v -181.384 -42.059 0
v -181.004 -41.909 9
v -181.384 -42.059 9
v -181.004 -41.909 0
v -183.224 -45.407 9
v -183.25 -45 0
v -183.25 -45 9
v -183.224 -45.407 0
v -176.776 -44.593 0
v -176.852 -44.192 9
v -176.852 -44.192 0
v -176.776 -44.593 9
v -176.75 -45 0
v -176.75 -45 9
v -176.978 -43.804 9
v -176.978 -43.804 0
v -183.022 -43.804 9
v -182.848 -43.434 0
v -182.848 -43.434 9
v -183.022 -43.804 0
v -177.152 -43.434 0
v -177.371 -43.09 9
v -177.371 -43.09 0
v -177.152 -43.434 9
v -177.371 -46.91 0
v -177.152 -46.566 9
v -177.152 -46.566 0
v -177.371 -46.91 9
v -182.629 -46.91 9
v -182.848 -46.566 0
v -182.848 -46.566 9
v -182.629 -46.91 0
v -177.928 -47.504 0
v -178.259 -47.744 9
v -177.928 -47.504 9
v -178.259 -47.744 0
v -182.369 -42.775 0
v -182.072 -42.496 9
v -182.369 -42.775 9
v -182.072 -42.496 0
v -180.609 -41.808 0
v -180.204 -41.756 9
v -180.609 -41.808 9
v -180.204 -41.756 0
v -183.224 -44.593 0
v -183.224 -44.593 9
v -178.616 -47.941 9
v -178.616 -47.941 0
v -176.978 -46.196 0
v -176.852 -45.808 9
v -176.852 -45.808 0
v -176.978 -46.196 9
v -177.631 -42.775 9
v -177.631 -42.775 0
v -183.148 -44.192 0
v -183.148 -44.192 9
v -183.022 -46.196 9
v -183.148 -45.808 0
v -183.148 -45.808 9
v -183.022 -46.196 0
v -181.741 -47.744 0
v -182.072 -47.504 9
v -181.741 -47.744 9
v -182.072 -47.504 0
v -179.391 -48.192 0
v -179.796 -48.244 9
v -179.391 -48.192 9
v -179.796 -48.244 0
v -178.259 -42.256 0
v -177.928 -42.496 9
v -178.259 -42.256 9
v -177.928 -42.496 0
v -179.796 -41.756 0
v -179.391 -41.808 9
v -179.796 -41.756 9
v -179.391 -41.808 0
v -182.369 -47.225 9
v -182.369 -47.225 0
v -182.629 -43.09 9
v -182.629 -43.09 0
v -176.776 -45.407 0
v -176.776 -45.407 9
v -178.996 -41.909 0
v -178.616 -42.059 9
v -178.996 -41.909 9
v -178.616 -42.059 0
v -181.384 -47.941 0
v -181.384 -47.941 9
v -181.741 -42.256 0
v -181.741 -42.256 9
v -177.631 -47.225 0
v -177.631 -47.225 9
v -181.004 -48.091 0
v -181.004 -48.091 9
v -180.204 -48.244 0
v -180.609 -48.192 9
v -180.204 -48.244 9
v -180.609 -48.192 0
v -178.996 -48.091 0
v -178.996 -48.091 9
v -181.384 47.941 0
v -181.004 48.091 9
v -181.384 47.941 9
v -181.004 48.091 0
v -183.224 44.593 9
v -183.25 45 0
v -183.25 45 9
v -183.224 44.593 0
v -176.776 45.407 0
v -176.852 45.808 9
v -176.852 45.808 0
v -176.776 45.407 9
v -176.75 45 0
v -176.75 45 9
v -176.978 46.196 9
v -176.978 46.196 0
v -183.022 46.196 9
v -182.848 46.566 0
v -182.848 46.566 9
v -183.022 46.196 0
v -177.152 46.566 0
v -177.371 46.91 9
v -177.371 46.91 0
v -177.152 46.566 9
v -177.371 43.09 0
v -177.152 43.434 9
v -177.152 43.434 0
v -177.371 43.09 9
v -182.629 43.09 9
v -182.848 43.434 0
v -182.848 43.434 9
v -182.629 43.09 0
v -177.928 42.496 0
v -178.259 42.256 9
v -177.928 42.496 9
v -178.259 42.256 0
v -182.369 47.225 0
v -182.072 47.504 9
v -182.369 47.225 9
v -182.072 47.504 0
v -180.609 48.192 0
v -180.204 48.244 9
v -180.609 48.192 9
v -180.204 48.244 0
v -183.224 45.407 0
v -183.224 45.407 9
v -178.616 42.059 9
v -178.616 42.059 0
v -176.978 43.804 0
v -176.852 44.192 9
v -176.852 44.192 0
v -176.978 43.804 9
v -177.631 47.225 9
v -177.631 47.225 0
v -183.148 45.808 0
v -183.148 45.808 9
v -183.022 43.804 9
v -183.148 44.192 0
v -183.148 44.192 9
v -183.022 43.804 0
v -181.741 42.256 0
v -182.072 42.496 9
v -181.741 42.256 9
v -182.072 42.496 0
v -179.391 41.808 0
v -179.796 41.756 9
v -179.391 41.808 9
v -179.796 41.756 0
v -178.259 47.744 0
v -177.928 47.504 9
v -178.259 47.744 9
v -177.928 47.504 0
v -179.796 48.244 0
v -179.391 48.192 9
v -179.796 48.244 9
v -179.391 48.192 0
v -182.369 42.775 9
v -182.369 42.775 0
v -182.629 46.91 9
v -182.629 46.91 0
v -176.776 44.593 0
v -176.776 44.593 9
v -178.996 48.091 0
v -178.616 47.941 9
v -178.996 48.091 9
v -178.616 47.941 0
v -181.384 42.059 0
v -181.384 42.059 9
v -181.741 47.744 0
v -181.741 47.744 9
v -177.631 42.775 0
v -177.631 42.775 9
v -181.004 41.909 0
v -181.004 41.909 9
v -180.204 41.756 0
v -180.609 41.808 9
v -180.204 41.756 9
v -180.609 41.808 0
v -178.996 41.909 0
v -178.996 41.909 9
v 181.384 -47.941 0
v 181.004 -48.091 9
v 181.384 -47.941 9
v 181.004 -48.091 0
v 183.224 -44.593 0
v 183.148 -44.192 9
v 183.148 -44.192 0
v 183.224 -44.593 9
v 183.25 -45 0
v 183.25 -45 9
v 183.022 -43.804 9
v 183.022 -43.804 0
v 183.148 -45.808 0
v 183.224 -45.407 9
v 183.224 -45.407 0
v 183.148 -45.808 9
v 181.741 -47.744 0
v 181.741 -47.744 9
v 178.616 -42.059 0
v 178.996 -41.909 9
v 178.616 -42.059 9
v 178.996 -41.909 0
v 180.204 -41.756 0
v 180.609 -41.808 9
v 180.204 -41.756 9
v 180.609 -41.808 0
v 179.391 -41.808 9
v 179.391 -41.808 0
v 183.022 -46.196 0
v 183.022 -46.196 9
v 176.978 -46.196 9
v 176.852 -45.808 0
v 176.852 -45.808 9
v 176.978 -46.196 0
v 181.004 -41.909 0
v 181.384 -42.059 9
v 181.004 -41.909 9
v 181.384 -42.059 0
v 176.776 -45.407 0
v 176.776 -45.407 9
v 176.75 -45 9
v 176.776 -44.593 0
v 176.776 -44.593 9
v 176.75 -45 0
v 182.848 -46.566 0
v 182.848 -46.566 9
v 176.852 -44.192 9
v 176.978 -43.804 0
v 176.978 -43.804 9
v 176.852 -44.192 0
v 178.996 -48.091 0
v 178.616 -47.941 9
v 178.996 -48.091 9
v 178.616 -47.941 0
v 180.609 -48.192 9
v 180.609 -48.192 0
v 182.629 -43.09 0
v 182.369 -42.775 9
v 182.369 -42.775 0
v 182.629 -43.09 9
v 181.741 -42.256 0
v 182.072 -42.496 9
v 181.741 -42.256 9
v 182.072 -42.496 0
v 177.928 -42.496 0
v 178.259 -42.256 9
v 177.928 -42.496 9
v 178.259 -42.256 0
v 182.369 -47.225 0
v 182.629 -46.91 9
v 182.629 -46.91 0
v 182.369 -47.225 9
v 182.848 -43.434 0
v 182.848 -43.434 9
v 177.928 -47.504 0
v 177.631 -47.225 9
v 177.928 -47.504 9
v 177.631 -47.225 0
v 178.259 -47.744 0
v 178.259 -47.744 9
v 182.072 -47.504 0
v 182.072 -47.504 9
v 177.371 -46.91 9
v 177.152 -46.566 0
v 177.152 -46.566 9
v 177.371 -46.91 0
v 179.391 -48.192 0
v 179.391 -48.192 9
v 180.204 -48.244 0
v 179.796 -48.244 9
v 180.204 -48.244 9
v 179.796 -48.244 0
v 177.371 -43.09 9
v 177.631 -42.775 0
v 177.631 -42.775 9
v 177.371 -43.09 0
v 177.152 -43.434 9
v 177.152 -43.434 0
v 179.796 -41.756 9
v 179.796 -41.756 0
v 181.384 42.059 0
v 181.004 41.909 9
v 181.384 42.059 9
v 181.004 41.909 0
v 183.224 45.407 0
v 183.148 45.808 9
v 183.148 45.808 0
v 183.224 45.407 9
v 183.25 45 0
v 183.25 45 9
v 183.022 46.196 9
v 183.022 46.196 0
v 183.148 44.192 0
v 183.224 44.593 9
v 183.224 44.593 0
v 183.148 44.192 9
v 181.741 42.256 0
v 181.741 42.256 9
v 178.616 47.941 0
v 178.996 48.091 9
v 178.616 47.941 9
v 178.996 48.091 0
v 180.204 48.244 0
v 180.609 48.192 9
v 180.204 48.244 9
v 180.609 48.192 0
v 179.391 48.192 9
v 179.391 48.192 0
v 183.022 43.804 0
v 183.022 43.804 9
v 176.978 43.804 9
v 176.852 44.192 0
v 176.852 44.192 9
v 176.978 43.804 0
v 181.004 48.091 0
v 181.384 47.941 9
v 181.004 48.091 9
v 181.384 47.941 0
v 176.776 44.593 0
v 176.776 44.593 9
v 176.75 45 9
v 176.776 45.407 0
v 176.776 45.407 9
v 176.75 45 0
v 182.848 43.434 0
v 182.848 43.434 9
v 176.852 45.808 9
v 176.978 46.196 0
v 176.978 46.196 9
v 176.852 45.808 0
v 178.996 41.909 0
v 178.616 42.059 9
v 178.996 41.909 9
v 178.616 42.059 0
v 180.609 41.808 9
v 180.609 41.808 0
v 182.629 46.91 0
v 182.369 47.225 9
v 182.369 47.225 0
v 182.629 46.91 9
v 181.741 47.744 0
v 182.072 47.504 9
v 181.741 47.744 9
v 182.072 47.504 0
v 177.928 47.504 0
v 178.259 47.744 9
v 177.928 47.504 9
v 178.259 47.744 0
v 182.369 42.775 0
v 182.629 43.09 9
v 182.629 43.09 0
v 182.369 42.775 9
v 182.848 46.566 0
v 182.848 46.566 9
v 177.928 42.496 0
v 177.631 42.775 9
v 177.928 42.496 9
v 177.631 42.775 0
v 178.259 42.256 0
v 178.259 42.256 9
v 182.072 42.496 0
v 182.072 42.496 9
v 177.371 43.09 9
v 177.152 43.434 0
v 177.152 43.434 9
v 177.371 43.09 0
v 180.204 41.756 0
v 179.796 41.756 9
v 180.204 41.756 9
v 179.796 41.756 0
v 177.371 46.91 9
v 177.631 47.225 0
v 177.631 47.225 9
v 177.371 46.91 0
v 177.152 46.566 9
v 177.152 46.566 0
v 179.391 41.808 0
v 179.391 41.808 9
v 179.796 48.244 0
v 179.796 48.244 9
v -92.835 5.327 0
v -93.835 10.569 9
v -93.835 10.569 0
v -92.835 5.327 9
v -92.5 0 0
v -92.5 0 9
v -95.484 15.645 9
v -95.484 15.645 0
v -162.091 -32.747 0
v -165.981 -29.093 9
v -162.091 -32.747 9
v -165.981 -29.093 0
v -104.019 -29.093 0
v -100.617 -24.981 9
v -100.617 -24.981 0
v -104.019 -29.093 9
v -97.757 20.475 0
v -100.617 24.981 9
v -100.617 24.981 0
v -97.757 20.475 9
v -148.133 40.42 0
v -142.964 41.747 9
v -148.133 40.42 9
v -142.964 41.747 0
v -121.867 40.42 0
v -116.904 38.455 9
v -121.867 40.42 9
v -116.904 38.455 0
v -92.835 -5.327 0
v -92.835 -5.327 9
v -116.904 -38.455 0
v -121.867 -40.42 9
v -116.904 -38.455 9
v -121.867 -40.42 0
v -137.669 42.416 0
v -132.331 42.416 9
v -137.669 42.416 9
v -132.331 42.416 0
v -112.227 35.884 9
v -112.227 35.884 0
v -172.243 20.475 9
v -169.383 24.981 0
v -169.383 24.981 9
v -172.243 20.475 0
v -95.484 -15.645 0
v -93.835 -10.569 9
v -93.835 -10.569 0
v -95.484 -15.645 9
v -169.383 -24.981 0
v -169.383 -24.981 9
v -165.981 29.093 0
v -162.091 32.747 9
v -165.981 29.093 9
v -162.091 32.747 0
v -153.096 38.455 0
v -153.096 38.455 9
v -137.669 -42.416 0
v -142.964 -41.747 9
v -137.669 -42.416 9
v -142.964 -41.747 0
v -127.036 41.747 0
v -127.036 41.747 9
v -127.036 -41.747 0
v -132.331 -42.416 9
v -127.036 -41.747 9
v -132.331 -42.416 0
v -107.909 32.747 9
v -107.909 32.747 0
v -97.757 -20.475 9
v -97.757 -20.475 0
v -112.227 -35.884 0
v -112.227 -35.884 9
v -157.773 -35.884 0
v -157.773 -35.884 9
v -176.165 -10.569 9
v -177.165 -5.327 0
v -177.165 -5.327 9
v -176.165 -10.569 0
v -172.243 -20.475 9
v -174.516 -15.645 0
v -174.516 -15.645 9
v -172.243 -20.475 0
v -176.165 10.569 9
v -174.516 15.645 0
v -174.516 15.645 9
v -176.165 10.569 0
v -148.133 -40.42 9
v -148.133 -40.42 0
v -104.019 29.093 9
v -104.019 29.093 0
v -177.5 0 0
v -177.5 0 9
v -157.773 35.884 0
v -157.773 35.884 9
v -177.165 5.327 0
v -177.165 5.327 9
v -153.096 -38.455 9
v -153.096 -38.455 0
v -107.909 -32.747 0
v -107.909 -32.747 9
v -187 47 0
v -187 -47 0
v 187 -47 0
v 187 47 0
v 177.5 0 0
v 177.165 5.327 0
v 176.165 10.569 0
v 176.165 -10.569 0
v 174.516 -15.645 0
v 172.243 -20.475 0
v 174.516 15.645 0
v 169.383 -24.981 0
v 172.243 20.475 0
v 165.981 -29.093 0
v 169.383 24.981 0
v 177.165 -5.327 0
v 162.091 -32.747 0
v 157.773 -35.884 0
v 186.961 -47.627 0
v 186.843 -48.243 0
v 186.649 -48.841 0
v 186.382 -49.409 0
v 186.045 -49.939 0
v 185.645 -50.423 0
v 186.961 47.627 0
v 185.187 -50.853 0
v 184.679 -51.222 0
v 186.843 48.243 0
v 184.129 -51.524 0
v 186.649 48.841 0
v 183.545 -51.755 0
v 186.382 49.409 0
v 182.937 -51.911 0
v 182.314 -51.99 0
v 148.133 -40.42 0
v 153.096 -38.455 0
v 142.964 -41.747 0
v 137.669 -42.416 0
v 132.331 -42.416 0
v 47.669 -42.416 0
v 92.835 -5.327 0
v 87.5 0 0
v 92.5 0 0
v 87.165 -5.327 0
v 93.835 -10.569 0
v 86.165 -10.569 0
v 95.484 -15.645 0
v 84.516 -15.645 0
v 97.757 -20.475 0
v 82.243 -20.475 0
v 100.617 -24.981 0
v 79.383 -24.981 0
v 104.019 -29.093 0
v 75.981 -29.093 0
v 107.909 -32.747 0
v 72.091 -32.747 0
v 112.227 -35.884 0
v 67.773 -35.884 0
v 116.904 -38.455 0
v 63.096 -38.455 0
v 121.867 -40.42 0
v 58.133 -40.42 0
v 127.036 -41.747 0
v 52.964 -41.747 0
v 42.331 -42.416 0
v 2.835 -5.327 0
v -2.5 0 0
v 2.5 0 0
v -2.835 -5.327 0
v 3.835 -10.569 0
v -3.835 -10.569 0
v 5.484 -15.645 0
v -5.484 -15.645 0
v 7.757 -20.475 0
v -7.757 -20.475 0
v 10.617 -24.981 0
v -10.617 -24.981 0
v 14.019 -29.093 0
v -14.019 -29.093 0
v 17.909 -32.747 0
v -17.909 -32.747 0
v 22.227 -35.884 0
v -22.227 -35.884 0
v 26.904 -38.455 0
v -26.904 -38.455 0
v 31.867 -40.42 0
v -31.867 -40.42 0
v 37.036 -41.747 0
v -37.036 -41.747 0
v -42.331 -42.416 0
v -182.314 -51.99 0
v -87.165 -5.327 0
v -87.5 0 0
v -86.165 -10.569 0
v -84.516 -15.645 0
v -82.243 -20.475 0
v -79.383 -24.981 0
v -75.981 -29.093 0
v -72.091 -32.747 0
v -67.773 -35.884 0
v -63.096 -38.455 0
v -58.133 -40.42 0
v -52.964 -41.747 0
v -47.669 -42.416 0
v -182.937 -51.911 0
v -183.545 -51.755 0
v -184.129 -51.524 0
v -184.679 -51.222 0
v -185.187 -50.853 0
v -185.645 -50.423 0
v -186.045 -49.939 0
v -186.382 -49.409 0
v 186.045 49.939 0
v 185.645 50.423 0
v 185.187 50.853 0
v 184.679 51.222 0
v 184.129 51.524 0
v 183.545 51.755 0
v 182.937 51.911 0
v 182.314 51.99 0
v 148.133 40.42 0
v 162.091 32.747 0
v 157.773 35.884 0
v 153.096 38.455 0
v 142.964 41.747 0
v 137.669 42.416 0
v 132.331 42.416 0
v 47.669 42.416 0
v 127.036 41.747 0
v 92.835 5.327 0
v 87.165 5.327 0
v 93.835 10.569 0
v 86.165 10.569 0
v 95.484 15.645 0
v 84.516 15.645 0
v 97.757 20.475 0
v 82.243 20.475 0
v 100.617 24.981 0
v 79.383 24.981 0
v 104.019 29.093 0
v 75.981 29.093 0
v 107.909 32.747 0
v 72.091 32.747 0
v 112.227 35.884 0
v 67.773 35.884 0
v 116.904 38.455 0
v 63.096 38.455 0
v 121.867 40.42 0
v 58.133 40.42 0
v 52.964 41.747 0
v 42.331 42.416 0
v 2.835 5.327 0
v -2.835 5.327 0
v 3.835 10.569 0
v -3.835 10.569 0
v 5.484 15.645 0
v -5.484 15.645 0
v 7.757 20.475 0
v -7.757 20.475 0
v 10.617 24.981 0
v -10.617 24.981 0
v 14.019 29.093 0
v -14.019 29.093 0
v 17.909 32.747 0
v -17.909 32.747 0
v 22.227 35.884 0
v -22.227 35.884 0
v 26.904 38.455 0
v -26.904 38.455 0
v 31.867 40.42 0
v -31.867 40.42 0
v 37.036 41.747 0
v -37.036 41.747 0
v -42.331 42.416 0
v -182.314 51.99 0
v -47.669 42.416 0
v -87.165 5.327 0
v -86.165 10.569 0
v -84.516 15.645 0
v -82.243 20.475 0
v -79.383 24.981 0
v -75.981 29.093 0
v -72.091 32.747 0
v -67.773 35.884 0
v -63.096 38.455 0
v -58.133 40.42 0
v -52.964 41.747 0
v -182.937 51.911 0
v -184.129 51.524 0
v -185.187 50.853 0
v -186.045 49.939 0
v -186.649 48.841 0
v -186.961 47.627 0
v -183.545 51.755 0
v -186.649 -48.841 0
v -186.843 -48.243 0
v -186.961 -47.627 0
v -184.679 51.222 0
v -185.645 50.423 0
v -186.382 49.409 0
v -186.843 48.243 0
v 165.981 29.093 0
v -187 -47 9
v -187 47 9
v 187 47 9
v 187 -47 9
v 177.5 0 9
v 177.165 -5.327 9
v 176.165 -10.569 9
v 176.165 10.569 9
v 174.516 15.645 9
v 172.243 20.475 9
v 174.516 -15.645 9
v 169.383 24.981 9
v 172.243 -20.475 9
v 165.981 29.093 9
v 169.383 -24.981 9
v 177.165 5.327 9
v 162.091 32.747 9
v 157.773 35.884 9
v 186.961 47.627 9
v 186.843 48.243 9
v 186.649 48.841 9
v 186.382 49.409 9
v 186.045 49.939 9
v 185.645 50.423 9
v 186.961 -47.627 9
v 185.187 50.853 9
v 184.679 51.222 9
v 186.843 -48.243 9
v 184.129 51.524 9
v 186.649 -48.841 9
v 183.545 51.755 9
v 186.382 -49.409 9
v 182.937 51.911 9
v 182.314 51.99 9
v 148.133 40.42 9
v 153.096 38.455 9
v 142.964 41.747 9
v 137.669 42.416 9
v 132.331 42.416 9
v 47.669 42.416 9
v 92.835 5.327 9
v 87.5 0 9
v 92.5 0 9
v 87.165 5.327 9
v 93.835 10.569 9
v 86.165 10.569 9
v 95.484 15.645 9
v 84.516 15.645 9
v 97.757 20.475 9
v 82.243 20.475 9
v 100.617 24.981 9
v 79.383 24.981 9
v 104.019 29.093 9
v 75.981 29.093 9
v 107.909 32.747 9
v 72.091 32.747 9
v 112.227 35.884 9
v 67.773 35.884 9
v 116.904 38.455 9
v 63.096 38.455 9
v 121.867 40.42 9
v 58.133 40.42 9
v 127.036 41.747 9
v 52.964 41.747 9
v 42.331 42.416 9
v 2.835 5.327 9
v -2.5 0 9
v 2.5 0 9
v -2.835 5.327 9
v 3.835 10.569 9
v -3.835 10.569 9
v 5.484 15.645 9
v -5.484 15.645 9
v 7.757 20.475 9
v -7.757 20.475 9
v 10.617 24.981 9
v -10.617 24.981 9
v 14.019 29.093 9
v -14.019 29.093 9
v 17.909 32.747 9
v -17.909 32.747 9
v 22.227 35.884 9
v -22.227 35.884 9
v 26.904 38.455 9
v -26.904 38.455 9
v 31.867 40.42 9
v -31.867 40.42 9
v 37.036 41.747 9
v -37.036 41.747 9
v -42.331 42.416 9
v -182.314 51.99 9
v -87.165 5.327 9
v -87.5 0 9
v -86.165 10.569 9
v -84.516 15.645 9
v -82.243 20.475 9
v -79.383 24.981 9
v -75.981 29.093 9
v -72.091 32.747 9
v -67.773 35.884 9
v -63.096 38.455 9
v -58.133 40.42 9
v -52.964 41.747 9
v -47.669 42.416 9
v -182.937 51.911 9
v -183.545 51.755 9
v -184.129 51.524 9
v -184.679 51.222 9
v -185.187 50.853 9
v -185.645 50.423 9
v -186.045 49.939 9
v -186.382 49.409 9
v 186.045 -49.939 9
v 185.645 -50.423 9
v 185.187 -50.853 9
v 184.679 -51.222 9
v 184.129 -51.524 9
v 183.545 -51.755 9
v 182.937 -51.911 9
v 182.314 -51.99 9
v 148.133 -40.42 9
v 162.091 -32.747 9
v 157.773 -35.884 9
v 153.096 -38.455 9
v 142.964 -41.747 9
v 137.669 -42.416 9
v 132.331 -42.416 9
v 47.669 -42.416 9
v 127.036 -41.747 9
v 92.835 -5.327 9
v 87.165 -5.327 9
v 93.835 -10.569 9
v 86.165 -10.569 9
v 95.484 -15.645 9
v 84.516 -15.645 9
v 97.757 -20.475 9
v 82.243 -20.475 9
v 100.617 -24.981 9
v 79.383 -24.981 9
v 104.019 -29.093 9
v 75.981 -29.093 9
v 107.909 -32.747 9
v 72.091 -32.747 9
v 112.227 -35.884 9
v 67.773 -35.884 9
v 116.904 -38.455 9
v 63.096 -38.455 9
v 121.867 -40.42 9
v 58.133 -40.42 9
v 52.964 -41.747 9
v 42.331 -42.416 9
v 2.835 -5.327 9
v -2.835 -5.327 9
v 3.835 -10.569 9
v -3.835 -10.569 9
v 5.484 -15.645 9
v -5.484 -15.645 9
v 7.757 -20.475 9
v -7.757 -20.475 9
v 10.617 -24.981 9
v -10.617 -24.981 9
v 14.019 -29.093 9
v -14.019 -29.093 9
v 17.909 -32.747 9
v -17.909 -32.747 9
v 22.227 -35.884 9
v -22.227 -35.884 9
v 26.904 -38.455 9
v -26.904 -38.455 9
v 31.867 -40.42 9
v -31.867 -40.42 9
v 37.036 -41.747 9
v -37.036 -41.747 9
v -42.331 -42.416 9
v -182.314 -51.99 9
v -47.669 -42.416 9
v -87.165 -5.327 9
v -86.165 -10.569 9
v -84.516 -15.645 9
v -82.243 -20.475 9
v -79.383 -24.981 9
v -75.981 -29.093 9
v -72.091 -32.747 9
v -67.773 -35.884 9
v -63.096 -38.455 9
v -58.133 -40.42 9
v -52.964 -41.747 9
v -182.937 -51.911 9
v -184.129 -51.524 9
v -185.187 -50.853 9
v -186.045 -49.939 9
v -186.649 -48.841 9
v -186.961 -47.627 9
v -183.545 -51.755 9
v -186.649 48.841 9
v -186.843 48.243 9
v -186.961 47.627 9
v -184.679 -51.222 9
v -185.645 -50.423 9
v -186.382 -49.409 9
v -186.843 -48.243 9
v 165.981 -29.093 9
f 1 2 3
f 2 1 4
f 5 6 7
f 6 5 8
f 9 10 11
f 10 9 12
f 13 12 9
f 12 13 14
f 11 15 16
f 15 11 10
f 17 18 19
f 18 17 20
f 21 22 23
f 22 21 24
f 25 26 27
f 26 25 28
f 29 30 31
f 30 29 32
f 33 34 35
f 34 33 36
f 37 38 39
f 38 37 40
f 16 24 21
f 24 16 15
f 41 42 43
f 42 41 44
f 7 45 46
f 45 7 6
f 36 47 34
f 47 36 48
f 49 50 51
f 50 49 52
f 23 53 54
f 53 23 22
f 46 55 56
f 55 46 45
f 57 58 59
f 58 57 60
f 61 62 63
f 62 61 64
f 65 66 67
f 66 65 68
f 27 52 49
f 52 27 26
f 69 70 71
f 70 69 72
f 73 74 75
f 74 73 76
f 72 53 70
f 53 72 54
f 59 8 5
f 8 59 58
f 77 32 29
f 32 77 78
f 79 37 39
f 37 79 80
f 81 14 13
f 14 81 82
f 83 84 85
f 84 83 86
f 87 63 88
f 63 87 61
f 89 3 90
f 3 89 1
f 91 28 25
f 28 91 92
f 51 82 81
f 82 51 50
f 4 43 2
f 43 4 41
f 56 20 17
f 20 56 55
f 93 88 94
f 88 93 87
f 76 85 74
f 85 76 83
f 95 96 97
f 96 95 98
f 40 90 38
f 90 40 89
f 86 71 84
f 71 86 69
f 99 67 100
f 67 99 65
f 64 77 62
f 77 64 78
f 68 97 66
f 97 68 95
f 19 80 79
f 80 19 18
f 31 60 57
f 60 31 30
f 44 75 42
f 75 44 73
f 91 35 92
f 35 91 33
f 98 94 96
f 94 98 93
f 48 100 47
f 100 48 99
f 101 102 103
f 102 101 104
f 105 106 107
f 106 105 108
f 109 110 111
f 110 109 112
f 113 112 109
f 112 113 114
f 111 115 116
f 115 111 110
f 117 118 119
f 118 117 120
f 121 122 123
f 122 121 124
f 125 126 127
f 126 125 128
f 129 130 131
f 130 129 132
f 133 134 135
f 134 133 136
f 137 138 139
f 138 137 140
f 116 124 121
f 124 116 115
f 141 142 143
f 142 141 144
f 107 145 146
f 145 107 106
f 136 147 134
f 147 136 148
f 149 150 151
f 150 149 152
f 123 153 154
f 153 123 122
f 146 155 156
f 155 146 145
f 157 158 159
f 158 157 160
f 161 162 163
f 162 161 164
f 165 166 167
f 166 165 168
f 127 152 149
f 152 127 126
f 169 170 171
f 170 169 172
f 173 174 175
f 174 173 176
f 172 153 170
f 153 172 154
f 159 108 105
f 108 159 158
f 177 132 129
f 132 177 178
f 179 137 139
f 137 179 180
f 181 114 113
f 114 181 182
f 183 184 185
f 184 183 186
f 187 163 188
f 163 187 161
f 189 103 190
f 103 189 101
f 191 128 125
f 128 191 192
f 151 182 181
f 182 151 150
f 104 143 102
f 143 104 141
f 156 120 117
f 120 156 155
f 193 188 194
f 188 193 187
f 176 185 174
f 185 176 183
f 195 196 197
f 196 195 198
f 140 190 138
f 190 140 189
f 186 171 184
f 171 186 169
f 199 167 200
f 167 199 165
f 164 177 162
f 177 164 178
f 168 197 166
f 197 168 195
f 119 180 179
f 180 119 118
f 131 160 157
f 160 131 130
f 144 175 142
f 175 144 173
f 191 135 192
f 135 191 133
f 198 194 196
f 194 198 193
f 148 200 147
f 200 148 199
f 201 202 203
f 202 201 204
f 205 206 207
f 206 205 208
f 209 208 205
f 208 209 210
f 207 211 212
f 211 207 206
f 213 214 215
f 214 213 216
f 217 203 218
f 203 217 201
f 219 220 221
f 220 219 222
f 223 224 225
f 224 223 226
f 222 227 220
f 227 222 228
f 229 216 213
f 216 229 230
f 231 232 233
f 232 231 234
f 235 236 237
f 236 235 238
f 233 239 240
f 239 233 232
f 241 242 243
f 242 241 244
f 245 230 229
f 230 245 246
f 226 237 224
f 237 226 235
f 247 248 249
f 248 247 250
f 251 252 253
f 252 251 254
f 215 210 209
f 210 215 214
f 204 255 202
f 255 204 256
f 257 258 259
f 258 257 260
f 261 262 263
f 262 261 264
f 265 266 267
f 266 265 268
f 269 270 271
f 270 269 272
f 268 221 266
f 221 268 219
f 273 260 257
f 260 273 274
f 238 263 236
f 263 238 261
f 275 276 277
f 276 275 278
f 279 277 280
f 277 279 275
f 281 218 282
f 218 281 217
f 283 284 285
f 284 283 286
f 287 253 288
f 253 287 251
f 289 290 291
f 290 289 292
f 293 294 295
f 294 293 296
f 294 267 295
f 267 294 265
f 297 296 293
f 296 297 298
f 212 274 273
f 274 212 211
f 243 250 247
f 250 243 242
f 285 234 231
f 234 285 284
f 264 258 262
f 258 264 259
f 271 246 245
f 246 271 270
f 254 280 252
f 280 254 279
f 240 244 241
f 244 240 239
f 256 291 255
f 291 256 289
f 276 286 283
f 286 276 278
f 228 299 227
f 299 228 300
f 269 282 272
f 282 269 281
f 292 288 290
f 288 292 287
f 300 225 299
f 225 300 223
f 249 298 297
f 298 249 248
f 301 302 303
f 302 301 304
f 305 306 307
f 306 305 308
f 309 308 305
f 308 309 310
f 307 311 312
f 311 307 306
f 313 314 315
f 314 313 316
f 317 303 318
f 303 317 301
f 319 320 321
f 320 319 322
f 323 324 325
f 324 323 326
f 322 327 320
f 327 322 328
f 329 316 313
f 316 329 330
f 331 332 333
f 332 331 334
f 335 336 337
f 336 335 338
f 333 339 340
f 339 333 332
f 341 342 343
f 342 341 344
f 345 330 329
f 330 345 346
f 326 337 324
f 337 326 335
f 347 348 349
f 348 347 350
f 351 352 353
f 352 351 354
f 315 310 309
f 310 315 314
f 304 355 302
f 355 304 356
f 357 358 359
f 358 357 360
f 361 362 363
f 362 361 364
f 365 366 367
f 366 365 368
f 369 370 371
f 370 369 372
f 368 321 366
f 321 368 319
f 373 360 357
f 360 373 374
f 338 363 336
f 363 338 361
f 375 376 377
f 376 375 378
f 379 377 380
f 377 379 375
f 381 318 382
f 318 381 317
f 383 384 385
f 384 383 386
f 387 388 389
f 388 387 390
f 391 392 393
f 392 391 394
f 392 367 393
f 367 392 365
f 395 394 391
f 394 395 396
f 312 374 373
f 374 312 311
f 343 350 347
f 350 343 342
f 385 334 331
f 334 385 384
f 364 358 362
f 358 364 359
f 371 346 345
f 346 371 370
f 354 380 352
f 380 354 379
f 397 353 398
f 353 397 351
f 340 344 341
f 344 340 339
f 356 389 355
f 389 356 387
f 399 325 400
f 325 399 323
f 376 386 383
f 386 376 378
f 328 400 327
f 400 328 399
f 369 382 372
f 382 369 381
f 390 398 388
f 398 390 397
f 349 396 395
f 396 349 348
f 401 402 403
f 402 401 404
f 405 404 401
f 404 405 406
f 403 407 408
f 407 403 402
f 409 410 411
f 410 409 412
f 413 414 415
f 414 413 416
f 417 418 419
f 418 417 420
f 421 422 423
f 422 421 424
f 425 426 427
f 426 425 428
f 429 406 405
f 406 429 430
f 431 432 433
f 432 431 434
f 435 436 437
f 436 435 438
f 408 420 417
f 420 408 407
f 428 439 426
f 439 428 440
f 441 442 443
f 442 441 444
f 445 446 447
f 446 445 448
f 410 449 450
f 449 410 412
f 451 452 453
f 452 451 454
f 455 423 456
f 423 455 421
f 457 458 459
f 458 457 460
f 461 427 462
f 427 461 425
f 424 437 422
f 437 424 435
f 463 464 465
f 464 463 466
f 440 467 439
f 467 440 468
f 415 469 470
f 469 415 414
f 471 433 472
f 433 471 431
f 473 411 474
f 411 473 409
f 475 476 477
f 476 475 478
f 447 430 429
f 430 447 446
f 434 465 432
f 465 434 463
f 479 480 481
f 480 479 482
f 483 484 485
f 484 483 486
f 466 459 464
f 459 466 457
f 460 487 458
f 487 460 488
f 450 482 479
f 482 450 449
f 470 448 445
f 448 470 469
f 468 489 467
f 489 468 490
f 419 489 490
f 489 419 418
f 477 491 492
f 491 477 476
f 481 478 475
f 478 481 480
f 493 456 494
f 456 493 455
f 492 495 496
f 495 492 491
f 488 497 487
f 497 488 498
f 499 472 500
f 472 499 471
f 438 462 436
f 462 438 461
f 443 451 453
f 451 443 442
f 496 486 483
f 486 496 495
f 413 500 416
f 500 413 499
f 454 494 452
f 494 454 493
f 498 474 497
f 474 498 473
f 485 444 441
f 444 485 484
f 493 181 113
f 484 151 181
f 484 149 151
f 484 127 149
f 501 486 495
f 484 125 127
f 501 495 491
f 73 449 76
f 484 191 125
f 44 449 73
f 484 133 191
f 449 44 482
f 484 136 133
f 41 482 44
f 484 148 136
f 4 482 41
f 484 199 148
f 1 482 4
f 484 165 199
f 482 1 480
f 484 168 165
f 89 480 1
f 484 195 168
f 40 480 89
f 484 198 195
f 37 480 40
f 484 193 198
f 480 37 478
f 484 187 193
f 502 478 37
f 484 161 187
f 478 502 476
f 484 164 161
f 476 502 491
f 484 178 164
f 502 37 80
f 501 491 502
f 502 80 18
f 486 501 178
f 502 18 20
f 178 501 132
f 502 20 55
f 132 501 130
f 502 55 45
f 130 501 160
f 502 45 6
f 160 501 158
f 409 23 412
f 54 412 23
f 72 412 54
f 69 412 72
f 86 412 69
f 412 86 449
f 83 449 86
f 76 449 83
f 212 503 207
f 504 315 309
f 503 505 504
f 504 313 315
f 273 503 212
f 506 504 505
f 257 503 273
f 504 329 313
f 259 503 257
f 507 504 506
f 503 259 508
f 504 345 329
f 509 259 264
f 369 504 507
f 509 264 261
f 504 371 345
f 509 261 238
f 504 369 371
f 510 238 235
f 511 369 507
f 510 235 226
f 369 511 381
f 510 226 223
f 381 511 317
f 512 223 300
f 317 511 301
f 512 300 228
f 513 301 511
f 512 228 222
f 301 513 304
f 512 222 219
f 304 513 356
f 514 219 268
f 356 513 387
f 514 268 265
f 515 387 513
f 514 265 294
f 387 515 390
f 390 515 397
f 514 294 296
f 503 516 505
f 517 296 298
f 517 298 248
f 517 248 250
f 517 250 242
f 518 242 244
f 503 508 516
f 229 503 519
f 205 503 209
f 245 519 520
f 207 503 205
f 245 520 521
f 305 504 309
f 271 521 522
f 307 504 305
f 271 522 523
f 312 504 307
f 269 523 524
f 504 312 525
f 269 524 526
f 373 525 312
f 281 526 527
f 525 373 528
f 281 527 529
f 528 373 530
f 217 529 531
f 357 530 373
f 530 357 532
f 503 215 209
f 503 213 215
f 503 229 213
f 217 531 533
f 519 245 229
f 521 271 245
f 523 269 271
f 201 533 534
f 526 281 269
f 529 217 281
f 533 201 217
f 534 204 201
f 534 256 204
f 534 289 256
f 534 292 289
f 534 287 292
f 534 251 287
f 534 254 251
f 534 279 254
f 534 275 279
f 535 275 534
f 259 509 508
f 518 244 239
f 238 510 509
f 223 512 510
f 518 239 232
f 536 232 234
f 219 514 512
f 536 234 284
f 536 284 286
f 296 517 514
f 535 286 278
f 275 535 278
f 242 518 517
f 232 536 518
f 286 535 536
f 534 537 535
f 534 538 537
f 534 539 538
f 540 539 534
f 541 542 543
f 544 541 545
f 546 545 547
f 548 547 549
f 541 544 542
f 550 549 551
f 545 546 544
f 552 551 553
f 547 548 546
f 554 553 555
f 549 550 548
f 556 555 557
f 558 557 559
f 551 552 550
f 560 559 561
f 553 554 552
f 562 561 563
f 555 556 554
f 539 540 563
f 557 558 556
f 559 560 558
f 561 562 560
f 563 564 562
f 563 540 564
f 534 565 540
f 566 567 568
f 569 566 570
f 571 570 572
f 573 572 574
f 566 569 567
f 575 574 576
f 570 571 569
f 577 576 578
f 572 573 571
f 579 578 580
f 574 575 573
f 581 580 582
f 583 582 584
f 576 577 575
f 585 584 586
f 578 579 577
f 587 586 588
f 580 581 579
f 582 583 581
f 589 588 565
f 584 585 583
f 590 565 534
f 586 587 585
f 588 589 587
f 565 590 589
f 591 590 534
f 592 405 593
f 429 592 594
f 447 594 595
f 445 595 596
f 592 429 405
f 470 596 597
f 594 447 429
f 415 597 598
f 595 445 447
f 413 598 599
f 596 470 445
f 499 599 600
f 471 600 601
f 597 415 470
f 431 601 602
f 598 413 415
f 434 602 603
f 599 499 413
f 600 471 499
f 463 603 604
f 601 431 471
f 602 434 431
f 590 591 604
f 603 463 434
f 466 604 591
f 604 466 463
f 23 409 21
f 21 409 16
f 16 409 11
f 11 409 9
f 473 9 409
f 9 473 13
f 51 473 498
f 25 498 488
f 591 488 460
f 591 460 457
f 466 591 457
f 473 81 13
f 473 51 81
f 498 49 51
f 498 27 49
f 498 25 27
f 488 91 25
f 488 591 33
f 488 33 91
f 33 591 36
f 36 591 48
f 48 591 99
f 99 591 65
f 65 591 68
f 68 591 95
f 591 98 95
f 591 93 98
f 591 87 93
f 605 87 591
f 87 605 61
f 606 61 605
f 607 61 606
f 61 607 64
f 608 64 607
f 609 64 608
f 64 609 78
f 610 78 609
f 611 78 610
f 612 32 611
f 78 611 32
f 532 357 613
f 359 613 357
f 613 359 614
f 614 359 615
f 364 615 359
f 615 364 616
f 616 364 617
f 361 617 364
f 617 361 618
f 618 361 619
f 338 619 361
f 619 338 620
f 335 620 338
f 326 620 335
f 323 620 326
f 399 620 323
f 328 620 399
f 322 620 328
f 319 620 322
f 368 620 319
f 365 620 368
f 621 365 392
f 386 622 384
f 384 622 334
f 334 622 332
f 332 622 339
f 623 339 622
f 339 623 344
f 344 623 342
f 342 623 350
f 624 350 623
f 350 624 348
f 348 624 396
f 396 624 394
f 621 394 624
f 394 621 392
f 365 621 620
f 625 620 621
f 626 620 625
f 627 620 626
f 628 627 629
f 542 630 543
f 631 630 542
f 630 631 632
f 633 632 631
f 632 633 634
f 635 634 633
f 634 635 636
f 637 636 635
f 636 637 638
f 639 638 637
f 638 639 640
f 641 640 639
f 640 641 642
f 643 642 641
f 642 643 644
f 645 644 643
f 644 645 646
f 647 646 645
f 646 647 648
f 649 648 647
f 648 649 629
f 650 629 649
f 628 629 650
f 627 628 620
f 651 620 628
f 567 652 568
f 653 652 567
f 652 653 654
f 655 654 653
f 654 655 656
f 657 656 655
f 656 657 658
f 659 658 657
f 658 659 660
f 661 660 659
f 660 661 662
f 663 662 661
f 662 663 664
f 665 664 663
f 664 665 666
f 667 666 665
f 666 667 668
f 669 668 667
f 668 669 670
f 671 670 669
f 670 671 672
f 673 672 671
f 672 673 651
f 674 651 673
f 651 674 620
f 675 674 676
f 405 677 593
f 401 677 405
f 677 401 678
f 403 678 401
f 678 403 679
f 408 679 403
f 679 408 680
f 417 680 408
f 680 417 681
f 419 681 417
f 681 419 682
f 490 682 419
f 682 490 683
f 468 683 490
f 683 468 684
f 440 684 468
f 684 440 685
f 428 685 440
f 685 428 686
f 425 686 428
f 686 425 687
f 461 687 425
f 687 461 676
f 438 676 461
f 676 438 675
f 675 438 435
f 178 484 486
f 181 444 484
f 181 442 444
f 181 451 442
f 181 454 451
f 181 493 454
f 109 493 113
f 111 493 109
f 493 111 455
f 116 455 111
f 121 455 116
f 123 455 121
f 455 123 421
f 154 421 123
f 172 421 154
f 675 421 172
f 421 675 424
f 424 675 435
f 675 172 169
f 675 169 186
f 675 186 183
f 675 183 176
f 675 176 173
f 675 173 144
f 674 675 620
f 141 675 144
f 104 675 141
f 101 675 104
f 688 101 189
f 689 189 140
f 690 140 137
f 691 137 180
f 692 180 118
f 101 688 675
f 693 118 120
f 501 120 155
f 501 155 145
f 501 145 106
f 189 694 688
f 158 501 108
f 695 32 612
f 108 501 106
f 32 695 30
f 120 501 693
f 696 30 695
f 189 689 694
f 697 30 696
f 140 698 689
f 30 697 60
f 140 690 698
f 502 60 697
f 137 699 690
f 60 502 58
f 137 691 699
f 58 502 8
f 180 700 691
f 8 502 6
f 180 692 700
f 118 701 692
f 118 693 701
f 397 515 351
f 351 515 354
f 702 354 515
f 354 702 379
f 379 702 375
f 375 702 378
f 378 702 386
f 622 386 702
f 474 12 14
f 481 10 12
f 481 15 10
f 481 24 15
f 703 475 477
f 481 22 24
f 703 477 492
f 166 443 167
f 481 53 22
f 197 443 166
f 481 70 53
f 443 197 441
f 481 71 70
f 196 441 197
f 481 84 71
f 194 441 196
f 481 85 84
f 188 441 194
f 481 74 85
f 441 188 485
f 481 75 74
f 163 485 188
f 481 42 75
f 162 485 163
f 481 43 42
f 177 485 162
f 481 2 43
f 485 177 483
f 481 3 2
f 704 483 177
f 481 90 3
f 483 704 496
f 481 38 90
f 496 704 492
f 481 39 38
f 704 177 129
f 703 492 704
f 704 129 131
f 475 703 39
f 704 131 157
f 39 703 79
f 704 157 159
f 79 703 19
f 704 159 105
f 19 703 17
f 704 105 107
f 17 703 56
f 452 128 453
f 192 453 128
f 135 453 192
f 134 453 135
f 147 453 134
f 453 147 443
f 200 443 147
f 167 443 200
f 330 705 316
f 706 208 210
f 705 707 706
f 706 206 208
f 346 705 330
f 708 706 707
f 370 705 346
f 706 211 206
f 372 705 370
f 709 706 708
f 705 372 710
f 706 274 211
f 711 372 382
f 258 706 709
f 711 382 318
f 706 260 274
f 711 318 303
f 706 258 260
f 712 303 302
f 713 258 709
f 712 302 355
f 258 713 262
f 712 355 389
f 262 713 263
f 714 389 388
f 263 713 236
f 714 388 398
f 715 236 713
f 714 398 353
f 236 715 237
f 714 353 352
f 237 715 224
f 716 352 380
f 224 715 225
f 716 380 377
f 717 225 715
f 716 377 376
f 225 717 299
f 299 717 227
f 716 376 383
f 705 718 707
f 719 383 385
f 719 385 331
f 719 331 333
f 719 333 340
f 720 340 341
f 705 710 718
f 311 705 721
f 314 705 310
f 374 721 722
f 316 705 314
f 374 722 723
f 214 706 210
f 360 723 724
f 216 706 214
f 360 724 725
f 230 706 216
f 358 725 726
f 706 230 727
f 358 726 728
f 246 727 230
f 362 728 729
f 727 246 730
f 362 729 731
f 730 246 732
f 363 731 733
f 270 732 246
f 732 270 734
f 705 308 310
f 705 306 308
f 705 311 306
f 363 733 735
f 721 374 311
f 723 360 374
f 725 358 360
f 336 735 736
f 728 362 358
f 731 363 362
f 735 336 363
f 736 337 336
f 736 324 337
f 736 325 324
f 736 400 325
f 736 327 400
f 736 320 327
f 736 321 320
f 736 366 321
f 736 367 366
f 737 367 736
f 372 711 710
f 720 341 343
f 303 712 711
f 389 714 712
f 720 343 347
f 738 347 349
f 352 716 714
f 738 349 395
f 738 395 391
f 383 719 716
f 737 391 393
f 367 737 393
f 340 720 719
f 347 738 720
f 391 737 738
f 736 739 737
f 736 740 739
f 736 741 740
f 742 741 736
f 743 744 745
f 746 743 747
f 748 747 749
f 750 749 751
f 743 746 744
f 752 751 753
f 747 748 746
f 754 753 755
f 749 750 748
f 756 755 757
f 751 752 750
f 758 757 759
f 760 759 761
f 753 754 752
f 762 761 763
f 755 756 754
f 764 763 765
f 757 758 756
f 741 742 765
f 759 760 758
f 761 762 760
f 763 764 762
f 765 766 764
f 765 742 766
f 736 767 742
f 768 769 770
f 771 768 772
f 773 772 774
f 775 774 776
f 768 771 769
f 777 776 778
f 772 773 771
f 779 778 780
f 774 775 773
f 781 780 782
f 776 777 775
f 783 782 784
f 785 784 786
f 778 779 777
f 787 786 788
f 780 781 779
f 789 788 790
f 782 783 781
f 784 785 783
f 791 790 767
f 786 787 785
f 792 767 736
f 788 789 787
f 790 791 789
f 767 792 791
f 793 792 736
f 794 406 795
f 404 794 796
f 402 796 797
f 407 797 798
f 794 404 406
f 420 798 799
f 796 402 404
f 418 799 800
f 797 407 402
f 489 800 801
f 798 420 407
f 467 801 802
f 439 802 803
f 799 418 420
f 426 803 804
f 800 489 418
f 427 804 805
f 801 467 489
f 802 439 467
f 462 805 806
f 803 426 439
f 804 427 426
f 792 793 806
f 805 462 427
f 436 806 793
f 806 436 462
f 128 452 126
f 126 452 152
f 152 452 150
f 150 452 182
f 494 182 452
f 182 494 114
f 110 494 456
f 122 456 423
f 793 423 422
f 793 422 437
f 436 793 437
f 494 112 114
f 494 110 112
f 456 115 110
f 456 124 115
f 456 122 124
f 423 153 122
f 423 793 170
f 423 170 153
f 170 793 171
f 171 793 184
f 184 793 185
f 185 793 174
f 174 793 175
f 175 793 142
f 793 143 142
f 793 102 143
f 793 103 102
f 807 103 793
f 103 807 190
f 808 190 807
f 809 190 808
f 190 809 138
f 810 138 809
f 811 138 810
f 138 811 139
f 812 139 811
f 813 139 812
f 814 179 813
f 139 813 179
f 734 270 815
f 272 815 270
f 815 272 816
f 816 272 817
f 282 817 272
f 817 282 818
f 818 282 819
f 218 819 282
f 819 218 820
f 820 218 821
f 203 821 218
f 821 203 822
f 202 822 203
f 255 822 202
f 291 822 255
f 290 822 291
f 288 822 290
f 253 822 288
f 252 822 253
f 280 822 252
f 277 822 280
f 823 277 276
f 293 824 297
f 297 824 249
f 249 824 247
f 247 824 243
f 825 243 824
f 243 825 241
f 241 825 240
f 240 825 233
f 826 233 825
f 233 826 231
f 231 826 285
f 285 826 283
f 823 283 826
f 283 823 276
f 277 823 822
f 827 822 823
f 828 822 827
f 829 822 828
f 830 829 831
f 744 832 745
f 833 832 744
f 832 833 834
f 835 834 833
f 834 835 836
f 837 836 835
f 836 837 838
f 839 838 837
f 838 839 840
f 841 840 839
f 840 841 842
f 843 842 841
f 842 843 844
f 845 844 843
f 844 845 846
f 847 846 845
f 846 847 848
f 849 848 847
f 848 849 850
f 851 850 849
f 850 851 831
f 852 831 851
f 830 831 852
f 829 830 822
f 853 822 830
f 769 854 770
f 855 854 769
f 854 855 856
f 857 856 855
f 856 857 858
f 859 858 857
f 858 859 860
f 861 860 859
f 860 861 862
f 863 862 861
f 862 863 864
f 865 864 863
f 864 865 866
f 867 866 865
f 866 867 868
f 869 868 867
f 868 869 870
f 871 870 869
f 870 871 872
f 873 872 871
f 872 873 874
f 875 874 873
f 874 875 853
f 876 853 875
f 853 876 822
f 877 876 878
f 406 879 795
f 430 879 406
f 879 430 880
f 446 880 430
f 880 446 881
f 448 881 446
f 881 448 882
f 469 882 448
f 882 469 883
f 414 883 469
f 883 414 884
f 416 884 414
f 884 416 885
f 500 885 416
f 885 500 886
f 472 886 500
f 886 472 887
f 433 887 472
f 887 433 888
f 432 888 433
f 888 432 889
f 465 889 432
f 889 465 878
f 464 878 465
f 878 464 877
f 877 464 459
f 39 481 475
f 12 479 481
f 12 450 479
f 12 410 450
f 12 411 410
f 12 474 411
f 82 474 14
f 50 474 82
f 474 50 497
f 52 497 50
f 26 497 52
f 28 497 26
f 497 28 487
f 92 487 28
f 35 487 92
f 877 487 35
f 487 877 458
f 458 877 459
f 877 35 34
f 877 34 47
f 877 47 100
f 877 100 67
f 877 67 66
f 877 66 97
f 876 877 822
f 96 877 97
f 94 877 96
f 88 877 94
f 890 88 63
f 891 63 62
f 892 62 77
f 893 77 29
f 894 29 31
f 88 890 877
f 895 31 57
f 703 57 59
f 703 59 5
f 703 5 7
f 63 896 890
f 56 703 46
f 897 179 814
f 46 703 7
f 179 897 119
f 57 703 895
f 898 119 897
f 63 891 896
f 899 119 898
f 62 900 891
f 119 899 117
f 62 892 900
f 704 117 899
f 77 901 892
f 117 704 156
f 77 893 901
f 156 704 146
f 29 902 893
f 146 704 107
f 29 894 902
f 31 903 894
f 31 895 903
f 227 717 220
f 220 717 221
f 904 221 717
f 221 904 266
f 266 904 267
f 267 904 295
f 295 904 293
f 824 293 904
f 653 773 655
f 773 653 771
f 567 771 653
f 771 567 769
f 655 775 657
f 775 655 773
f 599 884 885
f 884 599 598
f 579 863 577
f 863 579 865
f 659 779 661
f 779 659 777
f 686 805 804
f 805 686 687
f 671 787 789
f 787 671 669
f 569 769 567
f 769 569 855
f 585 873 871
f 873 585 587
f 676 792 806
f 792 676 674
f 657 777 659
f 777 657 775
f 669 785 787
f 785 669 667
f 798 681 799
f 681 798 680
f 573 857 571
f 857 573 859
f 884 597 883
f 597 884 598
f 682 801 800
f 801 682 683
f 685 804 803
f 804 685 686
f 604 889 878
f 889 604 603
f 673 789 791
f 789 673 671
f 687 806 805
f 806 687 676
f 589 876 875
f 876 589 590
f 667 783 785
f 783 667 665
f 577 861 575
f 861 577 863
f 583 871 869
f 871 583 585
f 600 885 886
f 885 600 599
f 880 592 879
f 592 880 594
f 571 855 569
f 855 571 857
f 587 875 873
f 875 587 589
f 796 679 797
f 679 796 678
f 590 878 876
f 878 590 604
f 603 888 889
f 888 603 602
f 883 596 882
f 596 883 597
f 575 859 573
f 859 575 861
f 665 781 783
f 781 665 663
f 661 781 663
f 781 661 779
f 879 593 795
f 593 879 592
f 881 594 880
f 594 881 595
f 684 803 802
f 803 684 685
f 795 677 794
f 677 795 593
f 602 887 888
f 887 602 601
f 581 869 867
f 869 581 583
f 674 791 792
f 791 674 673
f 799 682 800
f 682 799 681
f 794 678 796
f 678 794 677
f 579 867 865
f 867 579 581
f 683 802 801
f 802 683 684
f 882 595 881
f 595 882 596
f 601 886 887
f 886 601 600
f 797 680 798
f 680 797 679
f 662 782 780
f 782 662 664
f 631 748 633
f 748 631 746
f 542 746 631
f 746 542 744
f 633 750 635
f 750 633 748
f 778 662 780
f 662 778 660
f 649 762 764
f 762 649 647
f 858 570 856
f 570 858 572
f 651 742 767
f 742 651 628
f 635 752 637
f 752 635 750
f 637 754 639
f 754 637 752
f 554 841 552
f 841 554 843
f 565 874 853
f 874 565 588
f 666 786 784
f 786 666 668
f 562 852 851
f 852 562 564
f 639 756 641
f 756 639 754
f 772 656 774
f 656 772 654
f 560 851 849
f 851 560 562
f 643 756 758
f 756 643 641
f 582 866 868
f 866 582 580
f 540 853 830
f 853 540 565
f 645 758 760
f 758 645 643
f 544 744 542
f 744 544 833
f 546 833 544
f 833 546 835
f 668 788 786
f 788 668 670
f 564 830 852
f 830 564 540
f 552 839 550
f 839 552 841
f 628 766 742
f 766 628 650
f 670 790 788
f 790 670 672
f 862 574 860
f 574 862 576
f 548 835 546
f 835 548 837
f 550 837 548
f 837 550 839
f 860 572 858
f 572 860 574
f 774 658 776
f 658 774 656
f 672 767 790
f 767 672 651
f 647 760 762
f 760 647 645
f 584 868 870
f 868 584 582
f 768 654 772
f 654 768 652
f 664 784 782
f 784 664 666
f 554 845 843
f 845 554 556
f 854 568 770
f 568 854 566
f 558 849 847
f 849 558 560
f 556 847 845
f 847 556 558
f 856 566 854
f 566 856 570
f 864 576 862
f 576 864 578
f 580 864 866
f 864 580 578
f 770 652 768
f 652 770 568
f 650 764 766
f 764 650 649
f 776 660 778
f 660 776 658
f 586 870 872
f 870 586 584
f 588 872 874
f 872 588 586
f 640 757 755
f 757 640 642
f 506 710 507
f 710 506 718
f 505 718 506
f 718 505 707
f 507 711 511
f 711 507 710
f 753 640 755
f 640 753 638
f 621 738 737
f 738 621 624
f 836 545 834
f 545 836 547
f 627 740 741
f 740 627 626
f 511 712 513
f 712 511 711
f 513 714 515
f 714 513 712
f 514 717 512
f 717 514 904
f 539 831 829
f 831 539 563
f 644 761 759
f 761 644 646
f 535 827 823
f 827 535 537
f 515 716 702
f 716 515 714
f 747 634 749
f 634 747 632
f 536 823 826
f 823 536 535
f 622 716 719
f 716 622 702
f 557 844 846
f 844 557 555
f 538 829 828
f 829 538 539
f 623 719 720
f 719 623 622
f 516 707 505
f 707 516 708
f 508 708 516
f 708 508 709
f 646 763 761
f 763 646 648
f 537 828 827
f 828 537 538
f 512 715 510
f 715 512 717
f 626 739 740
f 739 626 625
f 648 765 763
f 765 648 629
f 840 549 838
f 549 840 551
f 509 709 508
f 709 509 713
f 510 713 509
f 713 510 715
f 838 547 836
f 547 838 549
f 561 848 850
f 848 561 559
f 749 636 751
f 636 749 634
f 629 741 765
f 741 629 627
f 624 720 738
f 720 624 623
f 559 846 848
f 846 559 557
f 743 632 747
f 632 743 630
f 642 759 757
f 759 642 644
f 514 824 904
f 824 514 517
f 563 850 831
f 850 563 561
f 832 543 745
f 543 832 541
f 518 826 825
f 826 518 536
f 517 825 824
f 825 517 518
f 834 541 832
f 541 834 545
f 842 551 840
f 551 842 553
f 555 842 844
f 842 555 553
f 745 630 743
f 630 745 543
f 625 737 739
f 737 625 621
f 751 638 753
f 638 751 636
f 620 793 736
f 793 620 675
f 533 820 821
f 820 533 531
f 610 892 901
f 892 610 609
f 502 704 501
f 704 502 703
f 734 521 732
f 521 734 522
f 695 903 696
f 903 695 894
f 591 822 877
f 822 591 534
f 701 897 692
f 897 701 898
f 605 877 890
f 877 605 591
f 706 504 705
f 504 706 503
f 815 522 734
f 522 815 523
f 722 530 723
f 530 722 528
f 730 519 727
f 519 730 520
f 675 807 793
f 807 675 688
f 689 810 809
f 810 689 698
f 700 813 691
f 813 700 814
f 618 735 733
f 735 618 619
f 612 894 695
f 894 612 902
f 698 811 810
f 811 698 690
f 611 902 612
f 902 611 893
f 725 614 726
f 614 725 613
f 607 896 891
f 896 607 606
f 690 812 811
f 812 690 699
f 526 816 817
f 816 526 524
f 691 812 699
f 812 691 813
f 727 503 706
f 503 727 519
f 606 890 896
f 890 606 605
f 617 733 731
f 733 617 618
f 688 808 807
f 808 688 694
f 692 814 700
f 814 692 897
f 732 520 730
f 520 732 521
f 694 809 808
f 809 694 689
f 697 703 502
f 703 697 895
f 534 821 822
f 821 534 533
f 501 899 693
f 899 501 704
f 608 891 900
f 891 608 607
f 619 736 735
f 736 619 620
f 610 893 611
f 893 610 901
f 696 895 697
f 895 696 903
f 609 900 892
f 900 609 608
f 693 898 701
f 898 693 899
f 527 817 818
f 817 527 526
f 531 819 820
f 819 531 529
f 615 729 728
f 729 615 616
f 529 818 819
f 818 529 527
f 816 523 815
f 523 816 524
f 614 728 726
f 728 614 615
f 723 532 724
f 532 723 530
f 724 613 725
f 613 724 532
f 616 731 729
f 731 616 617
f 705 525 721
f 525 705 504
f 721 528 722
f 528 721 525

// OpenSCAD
$fn = 50;


difference() {
	union() {
		hull() {
			translate(v = [-182.0000000000, 47.0000000000, 0]) {
				cylinder(h = 9, r = 5);
			}
			translate(v = [182.0000000000, 47.0000000000, 0]) {
				cylinder(h = 9, r = 5);
			}
			translate(v = [-182.0000000000, -47.0000000000, 0]) {
				cylinder(h = 9, r = 5);
			}
			translate(v = [182.0000000000, -47.0000000000, 0]) {
				cylinder(h = 9, r = 5);
			}
		}
	}
	union() {
		#translate(v = [-180.0000000000, -45.0000000000, -100.0000000000]) {
			cylinder(h = 200, r = 3.2500000000);
		}
		#translate(v = [-180.0000000000, 45.0000000000, -100.0000000000]) {
			cylinder(h = 200, r = 3.2500000000);
		}
		#translate(v = [180.0000000000, -45.0000000000, -100.0000000000]) {
			cylinder(h = 200, r = 3.2500000000);
		}
		#translate(v = [180.0000000000, 45.0000000000, -100.0000000000]) {
			cylinder(h = 200, r = 3.2500000000);
		}
		#translate(v = [-135.0000000000, 0, 0]) {
			cylinder(h = 9, r = 42.5000000000);
		}
		#translate(v = [-45.0000000000, 0, 0]) {
			cylinder(h = 9, r = 42.5000000000);
		}
		#translate(v = [45.0000000000, 0, 0]) {
			cylinder(h = 9, r = 42.5000000000);
		}
		#translate(v = [135.0000000000, 0, 0]) {
			cylinder(h = 9, r = 42.5000000000);
		}
	}
}
